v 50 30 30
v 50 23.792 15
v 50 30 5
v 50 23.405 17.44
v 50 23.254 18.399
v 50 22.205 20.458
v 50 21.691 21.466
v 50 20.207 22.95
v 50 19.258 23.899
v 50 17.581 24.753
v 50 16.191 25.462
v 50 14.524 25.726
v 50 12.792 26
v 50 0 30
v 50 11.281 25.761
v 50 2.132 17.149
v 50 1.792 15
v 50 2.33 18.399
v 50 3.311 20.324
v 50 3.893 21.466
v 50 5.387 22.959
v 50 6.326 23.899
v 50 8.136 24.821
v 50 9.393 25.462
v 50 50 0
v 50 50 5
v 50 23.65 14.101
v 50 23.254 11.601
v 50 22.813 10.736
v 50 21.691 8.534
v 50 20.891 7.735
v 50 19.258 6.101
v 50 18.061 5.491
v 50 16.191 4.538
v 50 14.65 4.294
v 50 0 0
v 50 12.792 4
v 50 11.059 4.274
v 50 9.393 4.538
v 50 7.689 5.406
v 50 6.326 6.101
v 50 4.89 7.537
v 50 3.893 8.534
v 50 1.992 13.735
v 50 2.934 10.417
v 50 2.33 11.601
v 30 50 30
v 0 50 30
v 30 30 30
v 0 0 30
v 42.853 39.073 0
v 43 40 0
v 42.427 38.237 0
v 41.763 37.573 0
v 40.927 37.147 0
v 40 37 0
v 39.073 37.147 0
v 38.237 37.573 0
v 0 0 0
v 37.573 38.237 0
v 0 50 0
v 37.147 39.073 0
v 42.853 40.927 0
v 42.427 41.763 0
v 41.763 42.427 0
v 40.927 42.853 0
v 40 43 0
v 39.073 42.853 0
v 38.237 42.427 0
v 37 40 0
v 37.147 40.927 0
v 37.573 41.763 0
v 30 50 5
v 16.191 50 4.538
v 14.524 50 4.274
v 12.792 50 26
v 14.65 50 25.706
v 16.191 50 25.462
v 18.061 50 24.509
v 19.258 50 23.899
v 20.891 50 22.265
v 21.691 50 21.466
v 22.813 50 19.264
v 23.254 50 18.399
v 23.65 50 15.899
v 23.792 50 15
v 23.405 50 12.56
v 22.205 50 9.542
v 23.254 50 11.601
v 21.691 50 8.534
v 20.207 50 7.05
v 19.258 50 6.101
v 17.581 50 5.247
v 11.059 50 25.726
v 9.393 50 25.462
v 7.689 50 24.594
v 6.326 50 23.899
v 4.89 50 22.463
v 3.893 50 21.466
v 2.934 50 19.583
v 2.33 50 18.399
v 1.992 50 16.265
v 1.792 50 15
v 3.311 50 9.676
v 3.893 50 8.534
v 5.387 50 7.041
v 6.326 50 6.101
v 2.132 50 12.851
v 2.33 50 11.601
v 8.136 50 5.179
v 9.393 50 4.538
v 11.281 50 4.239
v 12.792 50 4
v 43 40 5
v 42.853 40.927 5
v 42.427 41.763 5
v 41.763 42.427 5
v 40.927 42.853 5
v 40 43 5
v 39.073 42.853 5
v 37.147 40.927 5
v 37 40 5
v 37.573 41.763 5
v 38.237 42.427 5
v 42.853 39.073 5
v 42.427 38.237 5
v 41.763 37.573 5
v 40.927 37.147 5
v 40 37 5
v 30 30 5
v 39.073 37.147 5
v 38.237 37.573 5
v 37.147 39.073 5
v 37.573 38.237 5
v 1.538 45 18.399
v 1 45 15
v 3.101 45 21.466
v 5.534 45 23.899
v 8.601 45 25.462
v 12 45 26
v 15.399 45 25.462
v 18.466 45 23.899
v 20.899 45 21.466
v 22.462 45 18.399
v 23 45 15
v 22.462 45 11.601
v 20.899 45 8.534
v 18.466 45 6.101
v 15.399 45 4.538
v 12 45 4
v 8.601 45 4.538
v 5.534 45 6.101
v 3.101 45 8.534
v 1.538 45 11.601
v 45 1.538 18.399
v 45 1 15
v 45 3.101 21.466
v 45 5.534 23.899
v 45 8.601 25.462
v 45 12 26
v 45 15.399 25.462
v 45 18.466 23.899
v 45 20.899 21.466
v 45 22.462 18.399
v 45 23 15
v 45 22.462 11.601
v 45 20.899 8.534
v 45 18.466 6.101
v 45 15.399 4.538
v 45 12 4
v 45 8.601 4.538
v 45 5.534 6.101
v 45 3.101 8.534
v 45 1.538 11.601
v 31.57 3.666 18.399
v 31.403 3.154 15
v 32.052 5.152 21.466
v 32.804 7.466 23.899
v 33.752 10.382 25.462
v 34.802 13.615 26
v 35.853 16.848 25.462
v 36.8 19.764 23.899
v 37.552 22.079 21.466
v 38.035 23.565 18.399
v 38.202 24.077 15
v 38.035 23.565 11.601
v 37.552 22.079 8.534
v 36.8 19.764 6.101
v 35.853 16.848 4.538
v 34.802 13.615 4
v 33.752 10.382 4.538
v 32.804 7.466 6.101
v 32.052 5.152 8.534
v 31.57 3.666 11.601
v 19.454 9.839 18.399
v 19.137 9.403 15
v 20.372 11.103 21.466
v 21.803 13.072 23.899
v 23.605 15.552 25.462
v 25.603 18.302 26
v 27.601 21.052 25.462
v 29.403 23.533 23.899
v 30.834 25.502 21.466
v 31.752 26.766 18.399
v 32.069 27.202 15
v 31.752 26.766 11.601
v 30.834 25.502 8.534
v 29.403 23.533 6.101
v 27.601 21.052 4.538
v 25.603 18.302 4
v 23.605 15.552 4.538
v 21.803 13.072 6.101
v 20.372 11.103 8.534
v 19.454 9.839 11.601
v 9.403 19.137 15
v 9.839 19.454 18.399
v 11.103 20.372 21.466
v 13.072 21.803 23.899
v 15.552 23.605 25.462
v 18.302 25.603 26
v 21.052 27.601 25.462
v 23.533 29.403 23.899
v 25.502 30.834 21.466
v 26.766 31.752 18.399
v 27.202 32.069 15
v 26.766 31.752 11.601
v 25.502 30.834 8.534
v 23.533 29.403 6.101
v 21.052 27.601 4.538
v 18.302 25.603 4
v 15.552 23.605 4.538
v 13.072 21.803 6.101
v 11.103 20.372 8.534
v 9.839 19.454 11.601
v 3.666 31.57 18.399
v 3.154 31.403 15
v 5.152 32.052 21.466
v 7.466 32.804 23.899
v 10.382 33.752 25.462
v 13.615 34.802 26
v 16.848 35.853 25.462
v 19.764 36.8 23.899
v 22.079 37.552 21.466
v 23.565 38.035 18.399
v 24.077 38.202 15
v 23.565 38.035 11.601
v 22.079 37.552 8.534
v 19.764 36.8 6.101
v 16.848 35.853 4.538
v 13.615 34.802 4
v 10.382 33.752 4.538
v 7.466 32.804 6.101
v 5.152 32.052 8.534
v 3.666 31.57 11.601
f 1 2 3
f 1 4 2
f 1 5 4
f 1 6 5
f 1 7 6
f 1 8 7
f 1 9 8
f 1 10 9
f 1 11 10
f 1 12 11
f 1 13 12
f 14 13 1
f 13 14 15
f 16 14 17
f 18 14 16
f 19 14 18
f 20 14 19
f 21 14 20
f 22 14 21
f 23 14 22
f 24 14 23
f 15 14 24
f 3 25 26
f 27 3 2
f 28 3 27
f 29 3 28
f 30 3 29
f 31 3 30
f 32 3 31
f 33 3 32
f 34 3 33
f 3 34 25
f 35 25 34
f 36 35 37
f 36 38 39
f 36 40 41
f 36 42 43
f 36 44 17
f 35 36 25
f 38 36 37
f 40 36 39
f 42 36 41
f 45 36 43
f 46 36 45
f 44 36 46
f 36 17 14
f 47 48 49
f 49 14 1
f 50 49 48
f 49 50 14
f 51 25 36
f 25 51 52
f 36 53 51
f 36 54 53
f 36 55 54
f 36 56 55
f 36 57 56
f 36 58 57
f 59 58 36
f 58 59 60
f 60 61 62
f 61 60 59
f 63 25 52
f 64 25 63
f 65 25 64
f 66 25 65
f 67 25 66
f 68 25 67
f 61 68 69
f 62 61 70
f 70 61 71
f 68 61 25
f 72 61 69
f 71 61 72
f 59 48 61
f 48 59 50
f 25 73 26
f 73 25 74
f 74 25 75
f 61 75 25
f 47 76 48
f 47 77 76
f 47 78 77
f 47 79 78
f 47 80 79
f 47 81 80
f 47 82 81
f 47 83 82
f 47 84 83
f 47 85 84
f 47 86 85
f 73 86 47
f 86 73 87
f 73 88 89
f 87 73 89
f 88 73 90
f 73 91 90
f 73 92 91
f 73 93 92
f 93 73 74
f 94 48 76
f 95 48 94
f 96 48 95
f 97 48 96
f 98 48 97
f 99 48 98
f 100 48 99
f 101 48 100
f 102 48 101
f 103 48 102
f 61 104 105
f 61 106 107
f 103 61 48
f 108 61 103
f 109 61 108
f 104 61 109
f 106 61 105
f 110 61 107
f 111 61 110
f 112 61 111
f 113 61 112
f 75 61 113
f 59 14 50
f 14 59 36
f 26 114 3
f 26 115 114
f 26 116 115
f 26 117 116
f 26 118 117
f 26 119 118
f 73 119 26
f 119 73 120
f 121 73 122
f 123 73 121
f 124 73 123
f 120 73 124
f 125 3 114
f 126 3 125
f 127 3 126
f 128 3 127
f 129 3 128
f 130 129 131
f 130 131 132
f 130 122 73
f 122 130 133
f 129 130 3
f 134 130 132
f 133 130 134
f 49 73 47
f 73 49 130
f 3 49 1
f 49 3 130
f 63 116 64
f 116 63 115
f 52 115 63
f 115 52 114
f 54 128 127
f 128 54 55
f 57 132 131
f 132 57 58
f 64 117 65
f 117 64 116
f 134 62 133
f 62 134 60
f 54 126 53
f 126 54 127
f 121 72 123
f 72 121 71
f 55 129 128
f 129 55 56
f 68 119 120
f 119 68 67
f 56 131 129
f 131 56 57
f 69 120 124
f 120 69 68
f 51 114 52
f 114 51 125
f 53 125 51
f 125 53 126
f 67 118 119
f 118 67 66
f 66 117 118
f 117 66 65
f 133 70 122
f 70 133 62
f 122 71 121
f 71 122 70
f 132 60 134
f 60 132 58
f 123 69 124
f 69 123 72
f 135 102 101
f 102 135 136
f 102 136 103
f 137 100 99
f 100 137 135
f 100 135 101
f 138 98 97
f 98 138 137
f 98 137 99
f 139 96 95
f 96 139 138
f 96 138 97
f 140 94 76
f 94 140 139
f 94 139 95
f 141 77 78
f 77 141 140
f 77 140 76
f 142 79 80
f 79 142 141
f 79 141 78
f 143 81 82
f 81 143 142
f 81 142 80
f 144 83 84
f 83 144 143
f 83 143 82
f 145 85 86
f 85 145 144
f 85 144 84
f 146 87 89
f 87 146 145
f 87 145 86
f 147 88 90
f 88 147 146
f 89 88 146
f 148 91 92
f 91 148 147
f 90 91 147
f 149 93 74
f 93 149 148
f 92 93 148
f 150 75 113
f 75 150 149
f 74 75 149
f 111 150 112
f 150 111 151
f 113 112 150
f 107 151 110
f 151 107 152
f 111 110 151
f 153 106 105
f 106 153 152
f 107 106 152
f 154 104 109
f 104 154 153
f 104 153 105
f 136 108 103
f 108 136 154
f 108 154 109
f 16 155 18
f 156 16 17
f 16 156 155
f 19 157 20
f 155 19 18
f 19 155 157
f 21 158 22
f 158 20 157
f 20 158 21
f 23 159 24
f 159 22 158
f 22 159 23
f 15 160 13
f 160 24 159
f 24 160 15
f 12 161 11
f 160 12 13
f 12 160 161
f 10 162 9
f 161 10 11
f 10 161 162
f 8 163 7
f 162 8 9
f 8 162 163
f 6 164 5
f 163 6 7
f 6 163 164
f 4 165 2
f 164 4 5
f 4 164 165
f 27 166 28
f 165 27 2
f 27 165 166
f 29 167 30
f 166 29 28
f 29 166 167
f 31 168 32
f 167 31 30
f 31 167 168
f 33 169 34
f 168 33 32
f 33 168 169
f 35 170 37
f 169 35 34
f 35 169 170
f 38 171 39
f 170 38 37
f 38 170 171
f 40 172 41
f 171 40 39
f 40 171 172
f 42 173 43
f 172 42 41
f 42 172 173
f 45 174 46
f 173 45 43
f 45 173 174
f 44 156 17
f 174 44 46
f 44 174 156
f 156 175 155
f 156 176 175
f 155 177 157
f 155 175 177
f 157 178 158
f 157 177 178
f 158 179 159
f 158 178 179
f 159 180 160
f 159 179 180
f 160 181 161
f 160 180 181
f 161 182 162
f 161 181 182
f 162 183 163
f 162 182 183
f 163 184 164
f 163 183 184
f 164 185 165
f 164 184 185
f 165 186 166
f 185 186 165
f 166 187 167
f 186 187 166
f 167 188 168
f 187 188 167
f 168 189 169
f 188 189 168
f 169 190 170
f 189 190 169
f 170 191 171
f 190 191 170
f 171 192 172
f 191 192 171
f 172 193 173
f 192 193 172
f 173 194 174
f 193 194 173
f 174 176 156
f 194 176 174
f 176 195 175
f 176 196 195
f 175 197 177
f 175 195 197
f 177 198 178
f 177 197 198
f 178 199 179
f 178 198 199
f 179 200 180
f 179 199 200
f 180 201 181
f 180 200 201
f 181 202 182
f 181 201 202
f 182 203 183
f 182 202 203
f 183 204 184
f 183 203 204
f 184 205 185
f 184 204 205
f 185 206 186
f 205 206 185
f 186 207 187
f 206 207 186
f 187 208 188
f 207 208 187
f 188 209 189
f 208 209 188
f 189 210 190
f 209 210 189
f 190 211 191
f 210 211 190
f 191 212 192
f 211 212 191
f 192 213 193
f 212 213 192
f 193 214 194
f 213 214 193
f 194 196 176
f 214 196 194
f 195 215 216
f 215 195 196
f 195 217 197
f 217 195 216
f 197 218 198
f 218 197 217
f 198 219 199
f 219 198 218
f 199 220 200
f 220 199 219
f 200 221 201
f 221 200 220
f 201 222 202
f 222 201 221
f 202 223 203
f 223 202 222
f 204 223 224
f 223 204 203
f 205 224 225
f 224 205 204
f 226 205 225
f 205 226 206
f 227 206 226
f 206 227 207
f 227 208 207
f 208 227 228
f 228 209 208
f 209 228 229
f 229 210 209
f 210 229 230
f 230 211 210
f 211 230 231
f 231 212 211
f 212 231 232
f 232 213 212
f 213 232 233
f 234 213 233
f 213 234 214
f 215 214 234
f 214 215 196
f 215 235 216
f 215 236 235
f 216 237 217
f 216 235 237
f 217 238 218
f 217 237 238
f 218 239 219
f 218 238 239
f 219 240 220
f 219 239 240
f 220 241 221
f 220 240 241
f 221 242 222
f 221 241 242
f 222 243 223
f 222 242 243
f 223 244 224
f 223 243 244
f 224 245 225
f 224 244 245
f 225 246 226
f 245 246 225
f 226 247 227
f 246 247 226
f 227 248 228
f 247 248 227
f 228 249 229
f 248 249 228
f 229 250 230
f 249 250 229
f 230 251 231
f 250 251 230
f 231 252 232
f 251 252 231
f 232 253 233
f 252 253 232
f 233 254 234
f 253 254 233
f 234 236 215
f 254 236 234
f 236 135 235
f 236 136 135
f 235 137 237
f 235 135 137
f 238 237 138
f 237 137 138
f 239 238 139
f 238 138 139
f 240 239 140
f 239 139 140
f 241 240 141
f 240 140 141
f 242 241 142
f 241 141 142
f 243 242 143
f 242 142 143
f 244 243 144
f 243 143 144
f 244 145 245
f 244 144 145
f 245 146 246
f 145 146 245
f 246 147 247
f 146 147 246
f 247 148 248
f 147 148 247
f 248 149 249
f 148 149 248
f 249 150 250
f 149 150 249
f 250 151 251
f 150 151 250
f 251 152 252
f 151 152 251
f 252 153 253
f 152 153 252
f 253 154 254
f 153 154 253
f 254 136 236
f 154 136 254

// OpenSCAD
module pipe(
  length,
  radius)
{
  distance = length - (2*radius);
  hull()
  {
    translate([0,0,0])
    {
      sphere(r=radius);
    }

    translate([0,0,distance])
    {
      sphere(r=radius);
    }
  }
}


module wall2D(thickness)
{
  difference()
  {
    offset(thickness)
    {
      children(0);
    }

    children(0);
  }
}


module elbowinator(
  angle,
  bendRadius,
  clipBounds=1000,
  convexity=4)
{
  intersection(convexity=convexity)
  {
    rotate_extrude(convexity=convexity)
    {
      translate([bendRadius, 0, 0])
      {
        children(0);
      }
    }

    linear_extrude(
      height=clipBounds,
      slices=2,
      center=true)
    {
      wedge2D(angle, clipBounds);
    }
  }
}

module wedge2D(
  angle,
  radius,
  nSides=3)
{
  polygon(
    points=concat(
      [[0,0]],
      [for(i=[0:nSides])
          radius*[cos(i/nSides*angle), sin(i/nSides*angle)]]),
    convexity=4);
}

/*
//   50 mm elbow
translate([0, 0, 25])
{
  elbowinator(
    angle=90,
    bendRadius=50)
  {
    wall2D(thickness=2.4)
    {
      circle(r=22.8);
    }
  }
}
//*/


/*
//   '?' shaped hook
translate([0,60,0])
{
  rotate_extrude(angle=270, convexity=10)
  {
    translate([40, 0])
    {
      circle(10);
    }
  }
}

rotate_extrude(angle=90, convexity=10)
{
  translate([20, 0]) circle(10);
}

translate([20,0,0])
{
  rotate([90,0,0])
  {
    cylinder(r=10,h=80);
  }
}
//*/

/*
//   circle to oval
linear_extrude(
  height = 50,
  center = false,
  convexity = 10,
  scale=[1,5],
  $fn=100)
{
  translate([50, 0, 0])
  {
    circle(r = 10);
  }
}
//*/

/*
//   triangle to 2D line
linear_extrude(
  height=30,
  scale=[1, 0.1],
  slices=20,
  twist=0)
{
  polygon(
    points=[[0,0], [20,10], [20,-10]]);
}
//*/


/*
//   elbow with hemisphere caps
union()
{
  pipe(
    length=20,
    radius=5);

  rotate([90,0,0])
  {
    pipe(
      length=20,
      radius=5);
  }
}
//*/

///*
//   square elbow
$fn=20;
difference()
{
  // Main Cube
  cube (size = [50,50,30]);

  // Small cube for mounting flat
  translate (v=[30,30,5])
  {
    cube (size = [22,22,32]);
  }

  // Mounting hole
  translate (v=[40,40,-2])
  {
    cylinder(h = 10, r=3);
  }

  // Elbow
  translate([45,45,15])
  {
    #rotate_extrude()
    {
      translate([33,0,0])
      {
        circle(r=11);
      }
    }
  }
  
}
//*/

/*
//   elbow
difference()
{
  intersection()
  {
    translate([0,0,0])
    {
      rotate_extrude()
      {
        translate([33,0,0])
        {
          circle(r=11);
        }
      }
    }

    translate([0,0,-25])
    {
      cube ([50,50,50]);
    }
  }

  intersection()
  {
    translate([0,0,0])
    {
      rotate_extrude()
      {
        translate([33,0,0])
        {
          circle(r=8);
        }
      }
    }

    translate([0,0,-25])
    {
      cube ([50,50,50]);
    }
  }
}
//*/
